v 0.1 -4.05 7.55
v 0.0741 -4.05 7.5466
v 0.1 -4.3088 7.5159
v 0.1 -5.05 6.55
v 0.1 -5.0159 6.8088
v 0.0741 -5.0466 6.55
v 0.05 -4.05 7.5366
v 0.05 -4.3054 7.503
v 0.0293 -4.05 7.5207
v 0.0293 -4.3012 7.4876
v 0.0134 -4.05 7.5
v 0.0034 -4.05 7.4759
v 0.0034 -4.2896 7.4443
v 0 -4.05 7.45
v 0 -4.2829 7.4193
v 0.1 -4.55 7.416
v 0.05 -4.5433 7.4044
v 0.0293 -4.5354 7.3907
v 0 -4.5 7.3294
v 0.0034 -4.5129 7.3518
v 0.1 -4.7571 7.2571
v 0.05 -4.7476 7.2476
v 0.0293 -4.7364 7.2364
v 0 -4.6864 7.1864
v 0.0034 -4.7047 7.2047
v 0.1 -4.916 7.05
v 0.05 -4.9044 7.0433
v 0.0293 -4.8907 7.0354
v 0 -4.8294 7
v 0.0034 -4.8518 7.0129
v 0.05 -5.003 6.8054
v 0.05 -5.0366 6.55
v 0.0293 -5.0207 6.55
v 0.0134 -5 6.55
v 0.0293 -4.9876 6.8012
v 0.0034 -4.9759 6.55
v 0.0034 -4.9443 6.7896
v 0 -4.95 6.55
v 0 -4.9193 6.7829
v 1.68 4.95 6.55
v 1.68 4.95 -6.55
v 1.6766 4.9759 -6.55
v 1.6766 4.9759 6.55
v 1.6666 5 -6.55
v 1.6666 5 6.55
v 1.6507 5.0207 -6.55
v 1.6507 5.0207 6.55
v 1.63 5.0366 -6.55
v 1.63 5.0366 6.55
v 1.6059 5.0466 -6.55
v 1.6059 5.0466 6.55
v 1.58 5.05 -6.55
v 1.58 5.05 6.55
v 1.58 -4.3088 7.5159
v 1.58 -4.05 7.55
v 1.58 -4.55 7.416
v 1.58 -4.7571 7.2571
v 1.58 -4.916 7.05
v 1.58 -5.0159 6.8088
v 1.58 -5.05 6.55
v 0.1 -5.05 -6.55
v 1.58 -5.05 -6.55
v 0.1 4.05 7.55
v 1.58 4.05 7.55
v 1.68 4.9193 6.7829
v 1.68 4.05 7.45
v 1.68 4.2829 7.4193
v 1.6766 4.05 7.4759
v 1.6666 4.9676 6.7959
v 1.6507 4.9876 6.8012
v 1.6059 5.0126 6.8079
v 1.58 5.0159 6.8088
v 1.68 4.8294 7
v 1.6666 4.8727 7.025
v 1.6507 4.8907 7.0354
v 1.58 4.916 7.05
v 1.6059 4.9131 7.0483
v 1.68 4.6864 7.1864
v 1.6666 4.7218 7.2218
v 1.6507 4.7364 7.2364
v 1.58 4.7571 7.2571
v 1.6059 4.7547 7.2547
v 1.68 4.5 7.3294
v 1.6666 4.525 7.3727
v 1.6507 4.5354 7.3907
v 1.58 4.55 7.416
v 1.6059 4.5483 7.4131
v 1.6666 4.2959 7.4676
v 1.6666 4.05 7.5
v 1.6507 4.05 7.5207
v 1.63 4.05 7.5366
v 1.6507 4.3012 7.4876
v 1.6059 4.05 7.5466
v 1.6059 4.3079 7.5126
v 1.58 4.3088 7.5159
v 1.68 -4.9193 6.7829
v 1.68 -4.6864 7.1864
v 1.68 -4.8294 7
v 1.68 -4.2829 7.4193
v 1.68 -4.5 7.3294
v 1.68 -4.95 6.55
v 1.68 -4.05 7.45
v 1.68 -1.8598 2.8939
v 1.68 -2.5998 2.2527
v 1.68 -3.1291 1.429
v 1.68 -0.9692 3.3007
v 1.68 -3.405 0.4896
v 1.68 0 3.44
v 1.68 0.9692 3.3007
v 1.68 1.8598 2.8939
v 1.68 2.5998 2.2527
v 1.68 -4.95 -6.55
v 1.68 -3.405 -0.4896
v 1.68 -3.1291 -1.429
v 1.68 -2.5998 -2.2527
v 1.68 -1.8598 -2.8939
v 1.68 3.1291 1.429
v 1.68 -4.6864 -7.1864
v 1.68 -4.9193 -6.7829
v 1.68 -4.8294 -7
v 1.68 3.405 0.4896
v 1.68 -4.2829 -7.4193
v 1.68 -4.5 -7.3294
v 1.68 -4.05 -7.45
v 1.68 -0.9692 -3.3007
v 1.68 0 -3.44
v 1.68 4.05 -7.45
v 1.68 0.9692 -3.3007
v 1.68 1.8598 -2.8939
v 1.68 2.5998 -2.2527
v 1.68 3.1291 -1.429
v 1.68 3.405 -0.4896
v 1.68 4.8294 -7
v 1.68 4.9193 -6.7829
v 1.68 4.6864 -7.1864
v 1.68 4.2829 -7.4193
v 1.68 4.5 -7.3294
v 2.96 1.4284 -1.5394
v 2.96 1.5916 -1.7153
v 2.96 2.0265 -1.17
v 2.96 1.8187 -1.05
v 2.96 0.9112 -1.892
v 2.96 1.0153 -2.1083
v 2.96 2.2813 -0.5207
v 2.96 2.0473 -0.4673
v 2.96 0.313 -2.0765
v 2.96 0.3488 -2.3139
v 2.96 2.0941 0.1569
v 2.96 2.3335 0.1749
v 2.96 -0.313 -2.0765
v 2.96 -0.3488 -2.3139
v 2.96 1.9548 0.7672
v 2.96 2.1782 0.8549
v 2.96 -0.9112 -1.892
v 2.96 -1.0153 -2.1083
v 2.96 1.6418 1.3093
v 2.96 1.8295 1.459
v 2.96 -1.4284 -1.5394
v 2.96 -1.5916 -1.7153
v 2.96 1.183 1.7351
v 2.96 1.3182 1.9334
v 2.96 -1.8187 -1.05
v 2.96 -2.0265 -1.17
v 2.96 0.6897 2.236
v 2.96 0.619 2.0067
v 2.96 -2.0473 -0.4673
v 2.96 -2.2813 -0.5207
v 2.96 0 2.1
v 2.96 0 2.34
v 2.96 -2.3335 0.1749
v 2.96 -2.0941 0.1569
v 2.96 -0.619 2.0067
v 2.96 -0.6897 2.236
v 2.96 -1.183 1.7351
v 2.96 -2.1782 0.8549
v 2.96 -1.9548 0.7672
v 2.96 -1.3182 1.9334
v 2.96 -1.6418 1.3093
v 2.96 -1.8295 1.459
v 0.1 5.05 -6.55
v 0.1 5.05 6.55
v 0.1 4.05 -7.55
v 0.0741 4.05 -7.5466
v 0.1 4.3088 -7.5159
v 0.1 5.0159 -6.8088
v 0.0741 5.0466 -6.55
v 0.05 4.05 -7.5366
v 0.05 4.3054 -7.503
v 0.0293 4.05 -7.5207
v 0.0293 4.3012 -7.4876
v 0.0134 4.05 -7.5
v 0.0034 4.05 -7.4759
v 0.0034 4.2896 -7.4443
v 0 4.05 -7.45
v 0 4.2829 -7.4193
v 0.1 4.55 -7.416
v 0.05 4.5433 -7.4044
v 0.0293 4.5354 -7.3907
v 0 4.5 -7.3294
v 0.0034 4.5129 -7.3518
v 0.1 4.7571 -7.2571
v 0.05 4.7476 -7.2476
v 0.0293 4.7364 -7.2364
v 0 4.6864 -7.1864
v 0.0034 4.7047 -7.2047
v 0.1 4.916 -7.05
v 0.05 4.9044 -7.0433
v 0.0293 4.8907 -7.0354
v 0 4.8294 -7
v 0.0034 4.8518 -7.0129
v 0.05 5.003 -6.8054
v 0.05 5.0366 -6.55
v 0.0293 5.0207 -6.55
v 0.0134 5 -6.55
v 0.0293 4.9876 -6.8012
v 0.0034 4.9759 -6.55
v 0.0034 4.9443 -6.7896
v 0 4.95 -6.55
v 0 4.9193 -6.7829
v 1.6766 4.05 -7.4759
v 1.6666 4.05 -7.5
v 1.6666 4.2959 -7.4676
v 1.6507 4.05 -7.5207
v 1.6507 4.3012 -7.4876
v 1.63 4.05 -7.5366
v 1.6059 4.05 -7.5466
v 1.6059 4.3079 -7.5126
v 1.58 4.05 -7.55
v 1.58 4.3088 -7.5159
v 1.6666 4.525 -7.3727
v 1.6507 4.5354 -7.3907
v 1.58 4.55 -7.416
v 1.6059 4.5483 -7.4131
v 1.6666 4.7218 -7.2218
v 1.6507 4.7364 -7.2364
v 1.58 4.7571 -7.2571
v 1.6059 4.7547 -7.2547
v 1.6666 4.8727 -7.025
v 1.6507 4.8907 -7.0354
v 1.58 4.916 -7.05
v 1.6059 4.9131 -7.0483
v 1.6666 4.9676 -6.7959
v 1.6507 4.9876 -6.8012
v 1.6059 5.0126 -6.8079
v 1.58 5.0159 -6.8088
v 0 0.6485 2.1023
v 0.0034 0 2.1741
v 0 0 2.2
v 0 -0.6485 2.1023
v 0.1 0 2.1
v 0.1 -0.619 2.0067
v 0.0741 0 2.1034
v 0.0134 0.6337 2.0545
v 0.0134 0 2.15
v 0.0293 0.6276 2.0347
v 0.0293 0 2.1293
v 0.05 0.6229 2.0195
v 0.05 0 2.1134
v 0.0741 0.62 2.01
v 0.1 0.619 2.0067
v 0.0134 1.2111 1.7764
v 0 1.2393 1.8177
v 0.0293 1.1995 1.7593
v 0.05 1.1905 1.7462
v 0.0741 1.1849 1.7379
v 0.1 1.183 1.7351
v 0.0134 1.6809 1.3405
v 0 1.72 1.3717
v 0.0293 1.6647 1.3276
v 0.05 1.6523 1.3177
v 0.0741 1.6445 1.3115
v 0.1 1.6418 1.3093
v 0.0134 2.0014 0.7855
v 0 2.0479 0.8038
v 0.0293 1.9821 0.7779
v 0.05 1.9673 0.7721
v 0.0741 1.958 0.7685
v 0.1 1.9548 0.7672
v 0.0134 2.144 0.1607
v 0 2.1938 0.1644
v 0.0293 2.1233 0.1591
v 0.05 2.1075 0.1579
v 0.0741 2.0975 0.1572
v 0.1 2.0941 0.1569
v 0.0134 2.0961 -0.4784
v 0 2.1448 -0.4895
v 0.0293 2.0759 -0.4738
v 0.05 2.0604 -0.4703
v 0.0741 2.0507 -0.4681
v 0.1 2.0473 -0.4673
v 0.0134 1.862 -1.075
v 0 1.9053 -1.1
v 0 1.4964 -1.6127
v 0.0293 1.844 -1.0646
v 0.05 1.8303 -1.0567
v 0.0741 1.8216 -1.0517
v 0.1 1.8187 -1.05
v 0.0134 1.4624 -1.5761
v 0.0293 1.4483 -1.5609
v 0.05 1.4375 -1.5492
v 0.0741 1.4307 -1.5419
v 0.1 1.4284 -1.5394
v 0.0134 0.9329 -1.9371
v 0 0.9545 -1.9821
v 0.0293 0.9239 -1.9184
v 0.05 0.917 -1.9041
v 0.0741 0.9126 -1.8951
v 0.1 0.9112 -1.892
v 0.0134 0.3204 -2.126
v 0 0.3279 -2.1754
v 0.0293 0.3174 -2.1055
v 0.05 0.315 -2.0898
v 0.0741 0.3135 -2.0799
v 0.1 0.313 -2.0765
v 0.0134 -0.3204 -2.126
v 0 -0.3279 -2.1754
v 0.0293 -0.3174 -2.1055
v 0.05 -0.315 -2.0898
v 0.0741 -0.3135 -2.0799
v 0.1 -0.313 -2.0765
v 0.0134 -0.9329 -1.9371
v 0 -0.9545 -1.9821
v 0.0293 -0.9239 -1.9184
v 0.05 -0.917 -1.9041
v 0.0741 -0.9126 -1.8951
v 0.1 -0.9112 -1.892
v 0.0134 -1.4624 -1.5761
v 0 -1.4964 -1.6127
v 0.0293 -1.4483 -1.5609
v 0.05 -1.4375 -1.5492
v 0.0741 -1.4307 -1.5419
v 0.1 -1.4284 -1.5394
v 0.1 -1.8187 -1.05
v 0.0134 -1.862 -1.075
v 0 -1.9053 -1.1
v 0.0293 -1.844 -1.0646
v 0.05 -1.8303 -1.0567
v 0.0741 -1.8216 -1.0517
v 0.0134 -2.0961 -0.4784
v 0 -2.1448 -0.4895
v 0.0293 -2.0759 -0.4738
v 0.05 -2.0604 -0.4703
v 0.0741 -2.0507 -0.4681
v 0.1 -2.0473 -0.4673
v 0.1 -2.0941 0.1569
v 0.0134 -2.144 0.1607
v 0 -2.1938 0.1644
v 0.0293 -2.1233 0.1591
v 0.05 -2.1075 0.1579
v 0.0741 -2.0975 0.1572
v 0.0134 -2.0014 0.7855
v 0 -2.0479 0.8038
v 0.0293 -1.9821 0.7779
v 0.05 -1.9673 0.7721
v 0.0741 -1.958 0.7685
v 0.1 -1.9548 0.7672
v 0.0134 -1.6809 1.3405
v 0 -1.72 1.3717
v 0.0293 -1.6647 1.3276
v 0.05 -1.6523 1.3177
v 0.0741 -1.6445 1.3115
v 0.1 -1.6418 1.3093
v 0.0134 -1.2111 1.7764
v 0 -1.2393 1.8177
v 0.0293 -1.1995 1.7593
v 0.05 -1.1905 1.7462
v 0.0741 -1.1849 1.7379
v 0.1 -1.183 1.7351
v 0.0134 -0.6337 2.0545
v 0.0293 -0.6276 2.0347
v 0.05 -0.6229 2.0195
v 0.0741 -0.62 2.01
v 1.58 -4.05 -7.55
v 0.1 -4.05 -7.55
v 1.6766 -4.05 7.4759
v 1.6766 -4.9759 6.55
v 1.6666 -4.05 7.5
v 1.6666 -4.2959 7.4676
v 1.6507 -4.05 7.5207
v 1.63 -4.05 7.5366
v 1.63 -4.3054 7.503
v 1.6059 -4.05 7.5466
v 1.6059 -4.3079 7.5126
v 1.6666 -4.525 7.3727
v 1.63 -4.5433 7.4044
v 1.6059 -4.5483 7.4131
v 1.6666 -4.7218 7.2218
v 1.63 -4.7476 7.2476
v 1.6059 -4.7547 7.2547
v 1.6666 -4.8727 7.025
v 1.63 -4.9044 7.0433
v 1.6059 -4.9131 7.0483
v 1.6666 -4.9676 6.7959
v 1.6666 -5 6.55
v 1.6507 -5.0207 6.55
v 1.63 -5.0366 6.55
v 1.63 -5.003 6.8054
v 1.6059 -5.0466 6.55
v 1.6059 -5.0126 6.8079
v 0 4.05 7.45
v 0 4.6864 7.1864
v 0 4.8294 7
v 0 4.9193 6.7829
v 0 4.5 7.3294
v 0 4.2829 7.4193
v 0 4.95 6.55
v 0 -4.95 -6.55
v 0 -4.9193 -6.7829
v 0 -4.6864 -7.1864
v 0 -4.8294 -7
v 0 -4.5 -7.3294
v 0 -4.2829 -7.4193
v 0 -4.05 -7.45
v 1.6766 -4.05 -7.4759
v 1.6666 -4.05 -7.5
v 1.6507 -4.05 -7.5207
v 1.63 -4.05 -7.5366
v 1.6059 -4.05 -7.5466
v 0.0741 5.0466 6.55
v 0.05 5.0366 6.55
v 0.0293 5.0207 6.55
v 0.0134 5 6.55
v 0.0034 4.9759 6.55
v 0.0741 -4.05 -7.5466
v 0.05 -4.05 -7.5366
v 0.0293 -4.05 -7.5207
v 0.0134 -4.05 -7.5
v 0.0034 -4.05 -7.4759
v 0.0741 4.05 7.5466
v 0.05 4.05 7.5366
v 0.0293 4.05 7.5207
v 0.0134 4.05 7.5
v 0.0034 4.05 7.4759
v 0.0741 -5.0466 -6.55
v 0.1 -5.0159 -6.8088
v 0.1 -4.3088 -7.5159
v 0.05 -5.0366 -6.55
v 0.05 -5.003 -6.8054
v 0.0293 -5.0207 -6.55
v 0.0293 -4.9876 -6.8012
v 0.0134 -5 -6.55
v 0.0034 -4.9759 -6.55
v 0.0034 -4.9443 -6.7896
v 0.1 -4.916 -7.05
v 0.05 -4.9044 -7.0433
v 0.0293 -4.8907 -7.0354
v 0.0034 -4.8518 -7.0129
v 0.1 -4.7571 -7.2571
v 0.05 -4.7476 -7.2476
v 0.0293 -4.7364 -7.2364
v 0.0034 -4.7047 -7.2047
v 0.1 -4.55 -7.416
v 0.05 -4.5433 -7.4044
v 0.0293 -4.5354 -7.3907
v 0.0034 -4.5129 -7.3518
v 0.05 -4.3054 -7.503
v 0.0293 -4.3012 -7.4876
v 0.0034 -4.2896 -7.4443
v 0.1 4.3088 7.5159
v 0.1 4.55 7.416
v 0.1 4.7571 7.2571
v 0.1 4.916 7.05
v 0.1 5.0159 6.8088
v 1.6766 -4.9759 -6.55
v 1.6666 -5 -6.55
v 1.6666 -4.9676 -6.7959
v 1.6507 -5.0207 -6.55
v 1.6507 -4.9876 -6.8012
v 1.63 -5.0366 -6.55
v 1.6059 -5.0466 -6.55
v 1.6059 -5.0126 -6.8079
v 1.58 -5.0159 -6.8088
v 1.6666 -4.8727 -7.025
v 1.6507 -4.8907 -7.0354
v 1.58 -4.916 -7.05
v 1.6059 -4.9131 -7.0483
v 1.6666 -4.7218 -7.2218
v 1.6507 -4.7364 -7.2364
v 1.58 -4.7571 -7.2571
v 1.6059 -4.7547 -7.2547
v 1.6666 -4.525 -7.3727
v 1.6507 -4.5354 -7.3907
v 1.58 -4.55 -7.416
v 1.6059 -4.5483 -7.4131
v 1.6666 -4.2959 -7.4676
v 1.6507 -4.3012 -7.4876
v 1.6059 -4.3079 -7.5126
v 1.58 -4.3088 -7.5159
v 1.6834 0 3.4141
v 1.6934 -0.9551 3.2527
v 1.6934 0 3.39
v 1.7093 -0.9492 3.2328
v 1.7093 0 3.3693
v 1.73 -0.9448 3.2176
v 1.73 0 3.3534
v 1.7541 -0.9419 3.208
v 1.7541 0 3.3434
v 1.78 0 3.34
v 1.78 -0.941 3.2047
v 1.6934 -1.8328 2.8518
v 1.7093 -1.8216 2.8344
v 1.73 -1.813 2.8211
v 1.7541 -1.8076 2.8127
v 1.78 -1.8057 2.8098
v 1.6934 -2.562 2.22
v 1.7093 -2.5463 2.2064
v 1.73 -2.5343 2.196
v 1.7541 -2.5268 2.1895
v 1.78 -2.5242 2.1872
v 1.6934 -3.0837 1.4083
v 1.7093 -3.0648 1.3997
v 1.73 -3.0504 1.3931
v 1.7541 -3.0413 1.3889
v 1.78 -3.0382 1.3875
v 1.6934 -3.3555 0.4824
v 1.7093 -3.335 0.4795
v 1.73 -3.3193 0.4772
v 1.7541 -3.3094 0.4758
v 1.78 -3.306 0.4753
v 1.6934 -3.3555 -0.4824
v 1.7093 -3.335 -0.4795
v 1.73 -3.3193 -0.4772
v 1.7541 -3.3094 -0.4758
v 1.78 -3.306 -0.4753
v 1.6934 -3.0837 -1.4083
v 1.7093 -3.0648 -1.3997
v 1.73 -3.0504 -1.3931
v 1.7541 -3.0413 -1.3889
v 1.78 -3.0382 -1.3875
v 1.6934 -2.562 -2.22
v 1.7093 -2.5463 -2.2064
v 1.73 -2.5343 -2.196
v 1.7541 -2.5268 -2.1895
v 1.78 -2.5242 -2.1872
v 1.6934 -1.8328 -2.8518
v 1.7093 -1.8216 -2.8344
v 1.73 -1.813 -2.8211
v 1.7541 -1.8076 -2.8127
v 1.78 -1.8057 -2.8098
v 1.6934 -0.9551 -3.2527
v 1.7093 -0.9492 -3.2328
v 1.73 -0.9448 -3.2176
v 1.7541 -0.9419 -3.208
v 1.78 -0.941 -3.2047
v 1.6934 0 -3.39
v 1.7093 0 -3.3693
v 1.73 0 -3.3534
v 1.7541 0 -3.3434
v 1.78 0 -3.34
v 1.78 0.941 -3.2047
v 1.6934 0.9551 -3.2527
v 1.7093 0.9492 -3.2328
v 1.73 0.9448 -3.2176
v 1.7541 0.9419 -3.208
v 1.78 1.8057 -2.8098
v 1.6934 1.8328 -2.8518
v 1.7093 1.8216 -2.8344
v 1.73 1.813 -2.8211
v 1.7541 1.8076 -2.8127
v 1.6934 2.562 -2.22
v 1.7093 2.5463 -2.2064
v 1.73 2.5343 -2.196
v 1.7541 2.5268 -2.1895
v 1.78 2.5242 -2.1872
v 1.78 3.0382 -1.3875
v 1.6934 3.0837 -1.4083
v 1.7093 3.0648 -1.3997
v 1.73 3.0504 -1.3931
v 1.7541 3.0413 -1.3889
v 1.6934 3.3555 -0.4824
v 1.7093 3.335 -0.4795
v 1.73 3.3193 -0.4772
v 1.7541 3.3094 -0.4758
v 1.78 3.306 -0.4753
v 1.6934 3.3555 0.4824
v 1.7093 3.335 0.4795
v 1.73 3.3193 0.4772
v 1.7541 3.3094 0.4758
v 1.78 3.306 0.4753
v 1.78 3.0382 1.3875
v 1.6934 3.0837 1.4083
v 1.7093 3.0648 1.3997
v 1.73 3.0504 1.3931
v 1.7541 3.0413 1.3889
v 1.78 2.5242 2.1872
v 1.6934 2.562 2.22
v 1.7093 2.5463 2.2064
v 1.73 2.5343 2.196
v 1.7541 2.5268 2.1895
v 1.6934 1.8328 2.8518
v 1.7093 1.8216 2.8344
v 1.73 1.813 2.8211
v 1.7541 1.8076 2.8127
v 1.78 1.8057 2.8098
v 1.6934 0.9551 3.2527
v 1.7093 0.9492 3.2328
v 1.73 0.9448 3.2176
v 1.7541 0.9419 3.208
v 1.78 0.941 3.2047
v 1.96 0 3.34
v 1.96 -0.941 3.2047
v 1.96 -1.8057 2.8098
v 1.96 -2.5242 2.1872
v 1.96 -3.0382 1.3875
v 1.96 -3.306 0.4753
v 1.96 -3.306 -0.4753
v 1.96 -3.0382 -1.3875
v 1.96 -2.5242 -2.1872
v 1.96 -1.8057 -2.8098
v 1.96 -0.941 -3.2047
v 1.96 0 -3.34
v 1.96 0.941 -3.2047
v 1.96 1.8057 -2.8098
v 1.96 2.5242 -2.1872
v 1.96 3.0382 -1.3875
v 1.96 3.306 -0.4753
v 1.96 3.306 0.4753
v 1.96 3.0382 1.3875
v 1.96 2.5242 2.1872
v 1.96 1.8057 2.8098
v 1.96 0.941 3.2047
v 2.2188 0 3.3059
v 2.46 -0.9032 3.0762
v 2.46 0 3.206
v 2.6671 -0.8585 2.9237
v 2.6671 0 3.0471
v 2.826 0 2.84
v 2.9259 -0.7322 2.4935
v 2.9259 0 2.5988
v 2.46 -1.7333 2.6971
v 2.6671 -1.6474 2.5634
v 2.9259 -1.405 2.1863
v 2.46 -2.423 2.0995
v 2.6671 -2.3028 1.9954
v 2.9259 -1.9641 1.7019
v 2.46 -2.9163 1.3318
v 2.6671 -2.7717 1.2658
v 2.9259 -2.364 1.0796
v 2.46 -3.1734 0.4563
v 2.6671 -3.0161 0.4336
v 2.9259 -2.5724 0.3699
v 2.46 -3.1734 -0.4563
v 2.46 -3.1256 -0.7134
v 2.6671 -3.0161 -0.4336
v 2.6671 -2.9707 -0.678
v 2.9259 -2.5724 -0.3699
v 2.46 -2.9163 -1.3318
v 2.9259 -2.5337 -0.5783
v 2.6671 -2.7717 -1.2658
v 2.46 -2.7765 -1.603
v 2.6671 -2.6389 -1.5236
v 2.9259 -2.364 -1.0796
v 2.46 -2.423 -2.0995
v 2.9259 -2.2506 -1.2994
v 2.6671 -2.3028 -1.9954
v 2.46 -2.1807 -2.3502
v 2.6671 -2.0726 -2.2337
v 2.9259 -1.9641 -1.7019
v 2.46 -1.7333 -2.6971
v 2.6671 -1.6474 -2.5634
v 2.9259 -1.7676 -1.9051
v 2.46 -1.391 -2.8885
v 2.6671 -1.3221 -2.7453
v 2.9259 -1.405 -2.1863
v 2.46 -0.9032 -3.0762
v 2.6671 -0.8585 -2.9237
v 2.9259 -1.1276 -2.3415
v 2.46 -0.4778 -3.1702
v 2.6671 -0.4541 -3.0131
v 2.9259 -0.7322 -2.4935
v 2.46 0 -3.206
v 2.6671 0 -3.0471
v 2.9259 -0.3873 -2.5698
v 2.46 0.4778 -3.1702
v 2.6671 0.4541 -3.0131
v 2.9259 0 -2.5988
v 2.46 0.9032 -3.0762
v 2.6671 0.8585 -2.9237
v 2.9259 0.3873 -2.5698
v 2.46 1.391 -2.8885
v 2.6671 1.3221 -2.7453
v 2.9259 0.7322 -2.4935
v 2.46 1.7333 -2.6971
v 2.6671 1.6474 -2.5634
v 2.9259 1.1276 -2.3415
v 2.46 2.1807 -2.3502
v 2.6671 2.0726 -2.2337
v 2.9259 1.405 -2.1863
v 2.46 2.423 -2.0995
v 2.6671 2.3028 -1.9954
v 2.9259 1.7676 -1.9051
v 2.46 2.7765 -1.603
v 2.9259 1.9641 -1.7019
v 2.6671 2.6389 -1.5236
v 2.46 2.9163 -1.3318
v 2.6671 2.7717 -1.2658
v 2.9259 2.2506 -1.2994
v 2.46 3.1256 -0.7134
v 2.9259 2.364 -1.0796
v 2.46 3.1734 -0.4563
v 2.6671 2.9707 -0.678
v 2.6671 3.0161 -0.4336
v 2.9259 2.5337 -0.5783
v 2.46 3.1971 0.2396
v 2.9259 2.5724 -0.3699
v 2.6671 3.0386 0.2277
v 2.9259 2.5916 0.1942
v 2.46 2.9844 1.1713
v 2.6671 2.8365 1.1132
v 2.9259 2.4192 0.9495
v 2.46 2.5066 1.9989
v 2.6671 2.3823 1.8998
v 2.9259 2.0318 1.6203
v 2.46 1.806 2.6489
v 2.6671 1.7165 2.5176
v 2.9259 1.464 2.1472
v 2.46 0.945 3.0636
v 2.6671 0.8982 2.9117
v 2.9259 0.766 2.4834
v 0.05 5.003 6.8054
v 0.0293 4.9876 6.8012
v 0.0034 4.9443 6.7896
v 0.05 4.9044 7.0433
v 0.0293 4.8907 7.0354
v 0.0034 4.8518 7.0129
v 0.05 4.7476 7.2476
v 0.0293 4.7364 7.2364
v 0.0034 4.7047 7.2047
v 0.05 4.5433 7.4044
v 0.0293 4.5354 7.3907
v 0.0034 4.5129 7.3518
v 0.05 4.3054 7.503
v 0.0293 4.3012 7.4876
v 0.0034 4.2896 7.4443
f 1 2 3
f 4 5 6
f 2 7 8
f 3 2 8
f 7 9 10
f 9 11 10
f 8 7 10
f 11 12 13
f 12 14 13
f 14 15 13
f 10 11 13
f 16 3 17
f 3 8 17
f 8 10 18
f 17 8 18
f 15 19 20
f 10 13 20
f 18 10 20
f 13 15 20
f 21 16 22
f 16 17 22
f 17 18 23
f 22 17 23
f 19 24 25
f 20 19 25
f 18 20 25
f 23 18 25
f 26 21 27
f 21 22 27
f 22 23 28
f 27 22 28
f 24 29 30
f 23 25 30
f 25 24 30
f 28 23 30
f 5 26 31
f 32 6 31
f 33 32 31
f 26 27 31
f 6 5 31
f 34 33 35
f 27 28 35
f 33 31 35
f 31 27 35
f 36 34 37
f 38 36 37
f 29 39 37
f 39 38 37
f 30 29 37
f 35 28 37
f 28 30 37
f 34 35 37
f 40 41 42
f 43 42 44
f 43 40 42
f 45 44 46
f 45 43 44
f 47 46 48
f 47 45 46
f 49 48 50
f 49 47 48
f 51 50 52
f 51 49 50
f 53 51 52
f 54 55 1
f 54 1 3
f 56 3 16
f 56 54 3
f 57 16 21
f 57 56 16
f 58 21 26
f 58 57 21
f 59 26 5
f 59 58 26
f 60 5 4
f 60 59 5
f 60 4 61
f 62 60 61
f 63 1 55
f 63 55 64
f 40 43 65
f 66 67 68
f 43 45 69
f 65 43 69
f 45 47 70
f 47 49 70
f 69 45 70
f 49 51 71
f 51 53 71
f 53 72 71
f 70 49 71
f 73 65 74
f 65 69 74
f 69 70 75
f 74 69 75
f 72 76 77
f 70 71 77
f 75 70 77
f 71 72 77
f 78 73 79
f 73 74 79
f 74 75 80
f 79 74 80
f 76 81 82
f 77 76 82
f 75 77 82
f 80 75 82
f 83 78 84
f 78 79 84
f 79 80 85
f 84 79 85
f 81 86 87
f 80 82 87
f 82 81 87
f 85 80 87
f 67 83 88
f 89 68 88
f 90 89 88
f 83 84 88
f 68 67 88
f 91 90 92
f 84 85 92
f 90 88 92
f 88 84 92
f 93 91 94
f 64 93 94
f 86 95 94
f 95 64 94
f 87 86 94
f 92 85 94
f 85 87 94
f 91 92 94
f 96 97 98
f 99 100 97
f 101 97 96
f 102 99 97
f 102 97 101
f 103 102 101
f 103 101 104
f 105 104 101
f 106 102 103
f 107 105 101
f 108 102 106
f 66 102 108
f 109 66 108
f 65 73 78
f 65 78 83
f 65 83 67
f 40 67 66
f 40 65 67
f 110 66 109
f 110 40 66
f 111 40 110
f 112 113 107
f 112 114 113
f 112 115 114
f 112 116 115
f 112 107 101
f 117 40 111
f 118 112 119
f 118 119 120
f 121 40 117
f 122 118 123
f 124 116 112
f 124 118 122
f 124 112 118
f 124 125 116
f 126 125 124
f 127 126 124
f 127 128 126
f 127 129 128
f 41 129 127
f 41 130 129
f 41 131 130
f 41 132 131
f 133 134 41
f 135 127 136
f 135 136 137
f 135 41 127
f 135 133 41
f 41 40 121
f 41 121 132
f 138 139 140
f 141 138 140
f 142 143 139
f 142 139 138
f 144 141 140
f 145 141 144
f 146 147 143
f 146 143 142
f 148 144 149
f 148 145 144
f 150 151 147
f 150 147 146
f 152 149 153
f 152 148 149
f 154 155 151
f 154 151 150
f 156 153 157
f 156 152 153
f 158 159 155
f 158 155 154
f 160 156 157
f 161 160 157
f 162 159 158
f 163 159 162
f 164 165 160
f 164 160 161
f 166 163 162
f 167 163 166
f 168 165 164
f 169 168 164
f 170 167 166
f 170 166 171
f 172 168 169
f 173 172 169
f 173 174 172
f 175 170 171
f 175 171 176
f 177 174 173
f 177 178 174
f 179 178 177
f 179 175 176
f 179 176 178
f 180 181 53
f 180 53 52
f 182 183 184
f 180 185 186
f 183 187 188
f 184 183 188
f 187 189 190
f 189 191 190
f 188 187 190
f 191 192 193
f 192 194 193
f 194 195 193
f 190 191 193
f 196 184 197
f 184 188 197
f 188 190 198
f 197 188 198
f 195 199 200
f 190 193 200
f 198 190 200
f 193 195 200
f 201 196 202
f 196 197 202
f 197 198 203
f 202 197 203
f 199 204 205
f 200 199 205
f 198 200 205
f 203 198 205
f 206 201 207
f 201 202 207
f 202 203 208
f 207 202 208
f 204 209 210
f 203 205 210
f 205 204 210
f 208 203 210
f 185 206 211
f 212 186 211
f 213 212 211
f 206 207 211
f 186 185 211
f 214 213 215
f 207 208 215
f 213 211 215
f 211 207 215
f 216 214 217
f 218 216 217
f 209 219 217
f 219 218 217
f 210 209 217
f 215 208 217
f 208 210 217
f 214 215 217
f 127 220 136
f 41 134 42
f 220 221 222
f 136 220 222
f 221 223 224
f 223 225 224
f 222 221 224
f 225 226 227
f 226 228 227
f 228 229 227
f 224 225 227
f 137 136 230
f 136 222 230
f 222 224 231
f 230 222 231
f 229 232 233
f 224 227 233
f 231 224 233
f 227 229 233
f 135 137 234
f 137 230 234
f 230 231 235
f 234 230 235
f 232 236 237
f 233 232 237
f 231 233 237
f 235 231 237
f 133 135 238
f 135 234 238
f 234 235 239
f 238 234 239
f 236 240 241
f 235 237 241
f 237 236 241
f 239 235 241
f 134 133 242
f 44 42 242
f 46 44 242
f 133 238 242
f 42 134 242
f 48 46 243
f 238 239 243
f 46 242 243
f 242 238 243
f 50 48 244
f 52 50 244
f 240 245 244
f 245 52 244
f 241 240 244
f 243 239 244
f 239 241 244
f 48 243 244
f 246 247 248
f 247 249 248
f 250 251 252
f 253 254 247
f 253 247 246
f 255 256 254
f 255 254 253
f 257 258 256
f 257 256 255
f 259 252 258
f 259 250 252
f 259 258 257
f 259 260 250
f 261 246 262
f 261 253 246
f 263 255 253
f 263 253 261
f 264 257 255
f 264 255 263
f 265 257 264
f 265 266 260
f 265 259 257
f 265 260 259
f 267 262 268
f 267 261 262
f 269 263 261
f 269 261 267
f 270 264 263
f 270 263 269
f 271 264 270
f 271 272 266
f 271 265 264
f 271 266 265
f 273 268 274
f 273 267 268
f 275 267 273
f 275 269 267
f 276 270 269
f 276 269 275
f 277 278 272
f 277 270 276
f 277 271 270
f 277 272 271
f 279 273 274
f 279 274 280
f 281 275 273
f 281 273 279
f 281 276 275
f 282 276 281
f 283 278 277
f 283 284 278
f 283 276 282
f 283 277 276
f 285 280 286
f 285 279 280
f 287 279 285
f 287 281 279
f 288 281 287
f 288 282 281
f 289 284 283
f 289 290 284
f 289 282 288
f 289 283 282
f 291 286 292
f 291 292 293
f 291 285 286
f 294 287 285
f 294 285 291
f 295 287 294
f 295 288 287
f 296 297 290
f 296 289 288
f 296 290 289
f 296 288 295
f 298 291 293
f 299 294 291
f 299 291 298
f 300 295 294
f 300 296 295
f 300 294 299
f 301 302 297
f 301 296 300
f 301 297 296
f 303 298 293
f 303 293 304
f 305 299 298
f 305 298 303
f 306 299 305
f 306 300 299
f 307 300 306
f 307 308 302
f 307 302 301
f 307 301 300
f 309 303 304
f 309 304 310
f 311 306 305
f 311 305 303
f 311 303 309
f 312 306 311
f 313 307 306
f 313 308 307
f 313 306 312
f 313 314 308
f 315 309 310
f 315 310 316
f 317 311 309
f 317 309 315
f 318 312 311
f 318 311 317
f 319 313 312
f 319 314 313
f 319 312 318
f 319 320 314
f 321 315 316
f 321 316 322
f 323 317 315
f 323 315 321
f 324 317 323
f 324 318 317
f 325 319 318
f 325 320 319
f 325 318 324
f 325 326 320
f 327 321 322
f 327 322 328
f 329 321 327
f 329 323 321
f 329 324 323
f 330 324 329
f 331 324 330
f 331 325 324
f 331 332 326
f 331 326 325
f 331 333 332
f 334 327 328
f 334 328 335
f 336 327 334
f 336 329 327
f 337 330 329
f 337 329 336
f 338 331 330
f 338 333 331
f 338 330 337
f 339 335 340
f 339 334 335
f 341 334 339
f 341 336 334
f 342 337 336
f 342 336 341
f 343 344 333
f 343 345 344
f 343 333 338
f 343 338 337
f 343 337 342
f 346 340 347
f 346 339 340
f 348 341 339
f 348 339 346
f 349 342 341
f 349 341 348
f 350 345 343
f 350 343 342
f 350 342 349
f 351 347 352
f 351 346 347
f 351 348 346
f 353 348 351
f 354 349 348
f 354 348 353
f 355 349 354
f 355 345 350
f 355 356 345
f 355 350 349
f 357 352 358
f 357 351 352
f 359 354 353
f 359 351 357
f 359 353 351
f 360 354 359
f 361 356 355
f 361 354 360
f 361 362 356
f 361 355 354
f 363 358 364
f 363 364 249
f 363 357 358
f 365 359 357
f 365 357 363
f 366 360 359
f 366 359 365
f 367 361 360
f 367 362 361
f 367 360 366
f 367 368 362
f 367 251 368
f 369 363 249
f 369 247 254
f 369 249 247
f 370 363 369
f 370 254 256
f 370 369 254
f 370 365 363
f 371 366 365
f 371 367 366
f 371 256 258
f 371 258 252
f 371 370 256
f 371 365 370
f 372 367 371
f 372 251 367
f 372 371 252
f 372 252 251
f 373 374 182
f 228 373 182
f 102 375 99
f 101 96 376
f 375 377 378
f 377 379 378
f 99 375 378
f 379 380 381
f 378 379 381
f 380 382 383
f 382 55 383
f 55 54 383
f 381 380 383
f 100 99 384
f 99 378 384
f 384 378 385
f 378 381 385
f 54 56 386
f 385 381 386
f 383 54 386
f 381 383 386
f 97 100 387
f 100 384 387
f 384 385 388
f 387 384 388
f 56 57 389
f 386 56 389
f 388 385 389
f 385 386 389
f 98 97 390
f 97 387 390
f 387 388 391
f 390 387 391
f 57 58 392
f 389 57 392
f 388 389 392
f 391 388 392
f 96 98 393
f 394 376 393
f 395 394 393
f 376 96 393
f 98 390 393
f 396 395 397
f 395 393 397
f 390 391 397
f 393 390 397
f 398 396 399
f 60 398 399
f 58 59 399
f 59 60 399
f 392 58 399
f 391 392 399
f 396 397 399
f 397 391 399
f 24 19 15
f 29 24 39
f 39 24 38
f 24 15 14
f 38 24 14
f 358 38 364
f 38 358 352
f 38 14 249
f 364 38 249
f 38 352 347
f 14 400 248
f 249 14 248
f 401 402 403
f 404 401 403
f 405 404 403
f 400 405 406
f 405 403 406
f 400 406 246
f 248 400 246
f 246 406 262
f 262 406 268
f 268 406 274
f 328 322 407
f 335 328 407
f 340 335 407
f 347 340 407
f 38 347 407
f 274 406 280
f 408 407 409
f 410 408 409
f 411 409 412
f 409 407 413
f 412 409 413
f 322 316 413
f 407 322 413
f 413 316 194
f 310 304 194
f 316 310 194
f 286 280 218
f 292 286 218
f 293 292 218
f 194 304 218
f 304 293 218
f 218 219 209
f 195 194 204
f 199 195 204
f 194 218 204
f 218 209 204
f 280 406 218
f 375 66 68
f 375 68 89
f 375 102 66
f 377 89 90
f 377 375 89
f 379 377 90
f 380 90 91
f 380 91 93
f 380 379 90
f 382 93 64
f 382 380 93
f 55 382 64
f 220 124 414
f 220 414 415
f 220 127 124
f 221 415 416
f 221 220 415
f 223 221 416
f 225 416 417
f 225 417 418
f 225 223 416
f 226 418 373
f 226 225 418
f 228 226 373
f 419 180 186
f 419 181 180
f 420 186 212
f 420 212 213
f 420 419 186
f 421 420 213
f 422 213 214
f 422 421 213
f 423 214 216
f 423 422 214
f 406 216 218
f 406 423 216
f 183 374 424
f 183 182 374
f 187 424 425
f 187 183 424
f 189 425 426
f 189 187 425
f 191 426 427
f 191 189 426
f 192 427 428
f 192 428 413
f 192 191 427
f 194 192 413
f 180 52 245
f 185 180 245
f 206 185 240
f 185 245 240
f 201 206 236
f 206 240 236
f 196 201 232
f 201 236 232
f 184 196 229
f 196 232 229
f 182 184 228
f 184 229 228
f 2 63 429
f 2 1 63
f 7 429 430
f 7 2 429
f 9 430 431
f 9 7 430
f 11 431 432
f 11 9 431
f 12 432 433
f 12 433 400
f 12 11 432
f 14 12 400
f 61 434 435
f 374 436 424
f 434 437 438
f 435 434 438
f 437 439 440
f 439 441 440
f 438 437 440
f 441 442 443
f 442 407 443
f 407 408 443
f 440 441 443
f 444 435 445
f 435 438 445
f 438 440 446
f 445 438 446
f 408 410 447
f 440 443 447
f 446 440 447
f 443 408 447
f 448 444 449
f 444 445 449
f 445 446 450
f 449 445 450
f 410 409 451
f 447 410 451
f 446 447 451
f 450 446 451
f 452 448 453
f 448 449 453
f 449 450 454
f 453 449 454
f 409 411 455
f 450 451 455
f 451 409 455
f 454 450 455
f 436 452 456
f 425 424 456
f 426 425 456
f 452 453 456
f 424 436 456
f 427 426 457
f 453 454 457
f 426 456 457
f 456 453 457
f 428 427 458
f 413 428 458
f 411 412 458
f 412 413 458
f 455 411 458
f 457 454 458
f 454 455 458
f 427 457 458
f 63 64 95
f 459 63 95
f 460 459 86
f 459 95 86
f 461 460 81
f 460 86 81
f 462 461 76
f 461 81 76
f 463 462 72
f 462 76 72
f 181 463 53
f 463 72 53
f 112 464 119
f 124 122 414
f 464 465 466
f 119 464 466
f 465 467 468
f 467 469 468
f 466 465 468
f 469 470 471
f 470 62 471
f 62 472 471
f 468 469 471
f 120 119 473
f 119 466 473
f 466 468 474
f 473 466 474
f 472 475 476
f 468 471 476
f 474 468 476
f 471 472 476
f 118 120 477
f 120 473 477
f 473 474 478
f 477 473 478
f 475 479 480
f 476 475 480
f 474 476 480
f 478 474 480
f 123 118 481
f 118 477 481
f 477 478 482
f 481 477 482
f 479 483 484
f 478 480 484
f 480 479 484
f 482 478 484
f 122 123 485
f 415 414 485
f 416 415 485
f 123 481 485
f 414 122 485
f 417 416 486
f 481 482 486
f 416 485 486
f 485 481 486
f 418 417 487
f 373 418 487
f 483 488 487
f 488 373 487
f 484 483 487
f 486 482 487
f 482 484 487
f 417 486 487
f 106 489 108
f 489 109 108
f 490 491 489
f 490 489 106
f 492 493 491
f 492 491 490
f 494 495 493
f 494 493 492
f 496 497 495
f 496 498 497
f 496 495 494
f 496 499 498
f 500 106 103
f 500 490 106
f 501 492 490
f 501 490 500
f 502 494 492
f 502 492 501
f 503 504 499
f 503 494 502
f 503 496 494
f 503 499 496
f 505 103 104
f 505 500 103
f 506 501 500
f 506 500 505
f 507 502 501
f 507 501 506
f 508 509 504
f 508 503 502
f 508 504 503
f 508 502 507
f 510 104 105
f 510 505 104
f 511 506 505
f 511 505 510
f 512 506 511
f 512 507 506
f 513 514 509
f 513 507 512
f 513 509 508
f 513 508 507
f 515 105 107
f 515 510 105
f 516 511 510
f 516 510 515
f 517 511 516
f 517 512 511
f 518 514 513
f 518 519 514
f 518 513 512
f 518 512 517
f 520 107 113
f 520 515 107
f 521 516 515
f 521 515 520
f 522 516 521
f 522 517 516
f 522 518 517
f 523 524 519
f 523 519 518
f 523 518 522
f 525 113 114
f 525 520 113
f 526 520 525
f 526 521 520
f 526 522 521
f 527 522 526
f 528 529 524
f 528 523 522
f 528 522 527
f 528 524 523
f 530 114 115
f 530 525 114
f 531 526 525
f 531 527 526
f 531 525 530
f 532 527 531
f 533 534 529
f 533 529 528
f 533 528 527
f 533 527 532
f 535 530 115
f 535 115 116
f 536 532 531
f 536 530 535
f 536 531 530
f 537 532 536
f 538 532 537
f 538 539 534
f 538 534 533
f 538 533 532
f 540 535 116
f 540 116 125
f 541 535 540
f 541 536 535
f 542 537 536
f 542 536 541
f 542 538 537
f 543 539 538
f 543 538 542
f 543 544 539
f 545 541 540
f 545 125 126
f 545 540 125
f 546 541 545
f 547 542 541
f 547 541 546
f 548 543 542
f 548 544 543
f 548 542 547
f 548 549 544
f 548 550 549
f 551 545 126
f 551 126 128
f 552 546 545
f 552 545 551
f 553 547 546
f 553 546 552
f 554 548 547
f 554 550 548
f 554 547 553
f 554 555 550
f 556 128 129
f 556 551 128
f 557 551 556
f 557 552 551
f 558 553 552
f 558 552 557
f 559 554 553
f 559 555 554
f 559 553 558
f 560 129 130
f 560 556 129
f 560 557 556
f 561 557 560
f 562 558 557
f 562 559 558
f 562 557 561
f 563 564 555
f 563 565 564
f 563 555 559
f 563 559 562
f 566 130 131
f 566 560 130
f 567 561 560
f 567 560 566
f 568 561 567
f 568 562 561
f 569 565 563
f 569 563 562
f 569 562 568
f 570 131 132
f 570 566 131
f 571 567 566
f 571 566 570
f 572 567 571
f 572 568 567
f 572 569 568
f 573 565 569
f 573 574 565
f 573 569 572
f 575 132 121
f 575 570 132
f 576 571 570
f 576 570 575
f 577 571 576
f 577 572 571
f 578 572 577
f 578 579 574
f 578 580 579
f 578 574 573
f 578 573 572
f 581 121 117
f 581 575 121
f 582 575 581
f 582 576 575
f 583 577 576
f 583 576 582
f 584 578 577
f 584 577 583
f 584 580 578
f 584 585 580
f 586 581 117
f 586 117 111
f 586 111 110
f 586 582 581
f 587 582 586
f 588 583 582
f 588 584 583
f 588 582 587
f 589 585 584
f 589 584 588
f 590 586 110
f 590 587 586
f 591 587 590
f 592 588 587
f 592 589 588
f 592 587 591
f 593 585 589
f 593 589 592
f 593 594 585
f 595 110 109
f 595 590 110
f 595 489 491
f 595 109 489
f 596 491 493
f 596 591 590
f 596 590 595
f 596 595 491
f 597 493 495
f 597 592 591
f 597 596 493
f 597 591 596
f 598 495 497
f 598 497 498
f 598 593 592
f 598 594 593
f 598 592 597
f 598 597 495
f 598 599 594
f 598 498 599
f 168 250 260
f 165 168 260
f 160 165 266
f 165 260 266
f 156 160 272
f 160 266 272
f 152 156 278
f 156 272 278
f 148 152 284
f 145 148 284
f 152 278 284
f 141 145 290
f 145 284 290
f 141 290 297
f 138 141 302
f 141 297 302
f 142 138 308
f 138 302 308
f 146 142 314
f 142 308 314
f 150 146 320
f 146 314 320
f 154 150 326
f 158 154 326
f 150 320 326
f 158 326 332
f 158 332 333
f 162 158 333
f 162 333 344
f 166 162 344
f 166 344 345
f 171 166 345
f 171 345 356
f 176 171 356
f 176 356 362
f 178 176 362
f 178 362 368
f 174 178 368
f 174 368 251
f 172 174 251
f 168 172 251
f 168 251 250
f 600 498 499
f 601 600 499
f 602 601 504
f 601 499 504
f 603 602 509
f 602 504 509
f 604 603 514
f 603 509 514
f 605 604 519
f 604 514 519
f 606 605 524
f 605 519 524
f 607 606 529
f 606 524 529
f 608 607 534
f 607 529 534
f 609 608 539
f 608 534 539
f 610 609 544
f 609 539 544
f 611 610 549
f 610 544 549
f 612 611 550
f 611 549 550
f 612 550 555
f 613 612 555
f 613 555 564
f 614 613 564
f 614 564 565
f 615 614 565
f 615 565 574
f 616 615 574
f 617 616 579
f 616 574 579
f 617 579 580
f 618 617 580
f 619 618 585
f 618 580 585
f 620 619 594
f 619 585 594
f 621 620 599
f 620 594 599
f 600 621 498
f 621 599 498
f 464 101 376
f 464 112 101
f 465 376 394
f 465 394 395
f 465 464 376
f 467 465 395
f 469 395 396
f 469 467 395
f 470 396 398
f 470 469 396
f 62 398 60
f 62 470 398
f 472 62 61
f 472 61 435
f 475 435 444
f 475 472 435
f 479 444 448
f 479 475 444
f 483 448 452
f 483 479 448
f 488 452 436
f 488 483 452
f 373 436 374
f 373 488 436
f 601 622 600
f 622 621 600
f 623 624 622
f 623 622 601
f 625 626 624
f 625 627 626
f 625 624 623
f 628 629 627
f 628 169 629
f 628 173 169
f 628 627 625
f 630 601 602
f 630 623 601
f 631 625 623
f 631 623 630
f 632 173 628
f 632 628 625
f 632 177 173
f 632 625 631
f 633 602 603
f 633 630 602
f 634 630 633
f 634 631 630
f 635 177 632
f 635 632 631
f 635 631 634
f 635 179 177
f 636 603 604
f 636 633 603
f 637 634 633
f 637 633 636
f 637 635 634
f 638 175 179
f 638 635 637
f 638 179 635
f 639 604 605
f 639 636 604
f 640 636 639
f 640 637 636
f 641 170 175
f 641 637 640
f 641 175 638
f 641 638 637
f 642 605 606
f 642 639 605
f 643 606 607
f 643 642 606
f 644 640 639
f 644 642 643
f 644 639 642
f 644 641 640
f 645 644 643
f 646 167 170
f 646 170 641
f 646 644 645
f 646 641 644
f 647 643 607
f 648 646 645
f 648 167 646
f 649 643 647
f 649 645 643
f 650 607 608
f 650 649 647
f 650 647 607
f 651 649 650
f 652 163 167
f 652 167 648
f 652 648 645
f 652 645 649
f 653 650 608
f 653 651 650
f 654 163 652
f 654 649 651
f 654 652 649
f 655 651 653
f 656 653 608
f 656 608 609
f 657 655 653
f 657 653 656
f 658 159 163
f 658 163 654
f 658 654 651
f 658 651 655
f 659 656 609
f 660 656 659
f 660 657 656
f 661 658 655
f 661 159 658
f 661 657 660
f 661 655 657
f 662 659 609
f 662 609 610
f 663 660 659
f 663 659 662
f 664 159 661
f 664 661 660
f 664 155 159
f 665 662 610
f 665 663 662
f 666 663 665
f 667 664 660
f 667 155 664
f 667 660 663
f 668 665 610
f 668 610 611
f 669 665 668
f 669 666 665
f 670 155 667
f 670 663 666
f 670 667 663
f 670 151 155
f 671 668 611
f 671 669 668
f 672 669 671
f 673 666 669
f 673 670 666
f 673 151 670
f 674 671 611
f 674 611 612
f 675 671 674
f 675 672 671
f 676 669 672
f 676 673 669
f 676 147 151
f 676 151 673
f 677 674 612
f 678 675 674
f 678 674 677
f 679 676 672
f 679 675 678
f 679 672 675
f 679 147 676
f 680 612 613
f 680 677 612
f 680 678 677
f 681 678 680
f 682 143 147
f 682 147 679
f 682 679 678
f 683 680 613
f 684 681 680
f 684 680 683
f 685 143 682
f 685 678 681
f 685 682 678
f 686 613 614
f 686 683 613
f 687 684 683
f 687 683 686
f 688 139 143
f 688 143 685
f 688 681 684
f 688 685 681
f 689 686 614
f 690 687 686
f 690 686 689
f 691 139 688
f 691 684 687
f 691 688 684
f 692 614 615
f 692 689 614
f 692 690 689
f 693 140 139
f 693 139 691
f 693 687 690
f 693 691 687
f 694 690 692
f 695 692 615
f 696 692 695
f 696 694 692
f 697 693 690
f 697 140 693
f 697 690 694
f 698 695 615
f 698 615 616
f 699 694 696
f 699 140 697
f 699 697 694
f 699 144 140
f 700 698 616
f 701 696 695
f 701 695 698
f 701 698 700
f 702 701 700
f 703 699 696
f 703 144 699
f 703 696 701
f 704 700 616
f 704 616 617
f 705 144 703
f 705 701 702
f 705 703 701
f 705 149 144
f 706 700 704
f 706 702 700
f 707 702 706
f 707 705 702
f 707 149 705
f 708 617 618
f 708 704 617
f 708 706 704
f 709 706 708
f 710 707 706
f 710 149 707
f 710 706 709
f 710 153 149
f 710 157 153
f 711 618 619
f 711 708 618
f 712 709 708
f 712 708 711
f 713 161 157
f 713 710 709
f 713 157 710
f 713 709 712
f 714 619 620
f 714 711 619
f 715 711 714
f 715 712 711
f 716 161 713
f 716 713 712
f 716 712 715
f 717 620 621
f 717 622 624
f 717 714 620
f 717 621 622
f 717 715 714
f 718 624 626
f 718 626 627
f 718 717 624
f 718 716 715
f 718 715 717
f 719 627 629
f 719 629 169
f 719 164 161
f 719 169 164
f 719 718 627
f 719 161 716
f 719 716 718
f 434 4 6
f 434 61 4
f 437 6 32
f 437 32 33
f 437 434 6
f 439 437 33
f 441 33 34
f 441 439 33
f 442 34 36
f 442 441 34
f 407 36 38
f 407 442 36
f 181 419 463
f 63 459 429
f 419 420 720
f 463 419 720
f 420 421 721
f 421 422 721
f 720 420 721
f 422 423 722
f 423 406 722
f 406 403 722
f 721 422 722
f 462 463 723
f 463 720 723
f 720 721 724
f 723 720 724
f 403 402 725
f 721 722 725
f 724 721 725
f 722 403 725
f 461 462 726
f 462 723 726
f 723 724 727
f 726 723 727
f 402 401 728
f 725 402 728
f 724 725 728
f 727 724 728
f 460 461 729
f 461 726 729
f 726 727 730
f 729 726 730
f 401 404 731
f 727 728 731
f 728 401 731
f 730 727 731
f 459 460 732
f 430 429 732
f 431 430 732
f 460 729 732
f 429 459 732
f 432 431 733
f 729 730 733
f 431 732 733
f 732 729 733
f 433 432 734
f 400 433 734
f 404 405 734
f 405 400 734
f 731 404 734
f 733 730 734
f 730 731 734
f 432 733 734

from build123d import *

# Parameters (mm, degrees)
SKETCH1_W             = 15.1
SKETCH1_H             = 10.1
BOSS_EXTRUDE1_DEPTH   = 1.68
SKETCH3_R             = 3.34
BOSS_EXTRUDE2_DEPTH   = 1.28
FILLET1_R             = 1
M5X0_8_TAPPED_HOLE1_D = 4.2
FILLET2_R             = 1
FILLET3_R             = 0.1


with BuildPart() as part:
    # Sketch1 → Boss-Extrude1 (new body)
    with BuildSketch(Plane(origin=(0, 0, 0), x_dir=(0, 0, -1), z_dir=(1, 0, 0))):
        Rectangle(SKETCH1_W, SKETCH1_H)
    extrude(amount=BOSS_EXTRUDE1_DEPTH)

    # Sketch3 → Boss-Extrude2 (add)
    with BuildSketch(Plane(origin=(1.68, 0, 0), x_dir=(0, 0, -1), z_dir=(1, 0, 0))):
        with Locations(Location((0, 0, 0), (0, 0, 180))):
            Circle(SKETCH3_R)
    extrude(amount=BOSS_EXTRUDE2_DEPTH)

    # Fillet1
    fillet1_edges = [part.edges().sort_by_distance(p)[0] for p in [
        (2.96, 0, -3.34),
    ]]
    fillet(fillet1_edges, radius=FILLET1_R)

    # M5x0.8 Tapped Hole1 (through all)
    with Locations(Plane(origin=(2.96, 0, 0), x_dir=(0, 0, -1), z_dir=(1, 0, 0))):
        with Locations((0, 0)):
            Hole(M5X0_8_TAPPED_HOLE1_D / 2)

    # Fillet2
    fillet2_edges = [part.edges().sort_by_distance(p)[0] for p in [
        (0.84, 5.05, 7.55),
        (0.84, 5.05, -7.55),
        (0.84, -5.05, -7.55),
        (0.84, -5.05, 7.55),
    ]]
    fillet(fillet2_edges, radius=FILLET2_R)

    # Fillet3
    fillet3_edges = [part.edges().sort_by_distance(p)[0] for p in [
        (1.68, 0, -3.34),
        (0, 0, -2.1),
        (0, -5.05, 0),
        (1.68, -5.05, 0),
        (0, 0, 7.55),
        (0, 5.05, 0),
        (0, 0, -7.55),
        (0, 4.757106781, 7.257106781),
        (0, 4.757106781, -7.257106781),
        (0, -4.757106781, -7.257106781),
        (0, -4.757106781, 7.257106781),
        (1.68, 0, 7.55),
        (1.68, 0, -7.55),
        (1.68, 5.05, 0),
        (1.68, 4.757106781, 7.257106781),
        (1.68, 4.757106781, -7.257106781),
        (1.68, -4.757106781, -7.257106781),
        (1.68, -4.757106781, 7.257106781),
    ]]
    fillet(fillet3_edges, radius=FILLET3_R)


solid = part.part
